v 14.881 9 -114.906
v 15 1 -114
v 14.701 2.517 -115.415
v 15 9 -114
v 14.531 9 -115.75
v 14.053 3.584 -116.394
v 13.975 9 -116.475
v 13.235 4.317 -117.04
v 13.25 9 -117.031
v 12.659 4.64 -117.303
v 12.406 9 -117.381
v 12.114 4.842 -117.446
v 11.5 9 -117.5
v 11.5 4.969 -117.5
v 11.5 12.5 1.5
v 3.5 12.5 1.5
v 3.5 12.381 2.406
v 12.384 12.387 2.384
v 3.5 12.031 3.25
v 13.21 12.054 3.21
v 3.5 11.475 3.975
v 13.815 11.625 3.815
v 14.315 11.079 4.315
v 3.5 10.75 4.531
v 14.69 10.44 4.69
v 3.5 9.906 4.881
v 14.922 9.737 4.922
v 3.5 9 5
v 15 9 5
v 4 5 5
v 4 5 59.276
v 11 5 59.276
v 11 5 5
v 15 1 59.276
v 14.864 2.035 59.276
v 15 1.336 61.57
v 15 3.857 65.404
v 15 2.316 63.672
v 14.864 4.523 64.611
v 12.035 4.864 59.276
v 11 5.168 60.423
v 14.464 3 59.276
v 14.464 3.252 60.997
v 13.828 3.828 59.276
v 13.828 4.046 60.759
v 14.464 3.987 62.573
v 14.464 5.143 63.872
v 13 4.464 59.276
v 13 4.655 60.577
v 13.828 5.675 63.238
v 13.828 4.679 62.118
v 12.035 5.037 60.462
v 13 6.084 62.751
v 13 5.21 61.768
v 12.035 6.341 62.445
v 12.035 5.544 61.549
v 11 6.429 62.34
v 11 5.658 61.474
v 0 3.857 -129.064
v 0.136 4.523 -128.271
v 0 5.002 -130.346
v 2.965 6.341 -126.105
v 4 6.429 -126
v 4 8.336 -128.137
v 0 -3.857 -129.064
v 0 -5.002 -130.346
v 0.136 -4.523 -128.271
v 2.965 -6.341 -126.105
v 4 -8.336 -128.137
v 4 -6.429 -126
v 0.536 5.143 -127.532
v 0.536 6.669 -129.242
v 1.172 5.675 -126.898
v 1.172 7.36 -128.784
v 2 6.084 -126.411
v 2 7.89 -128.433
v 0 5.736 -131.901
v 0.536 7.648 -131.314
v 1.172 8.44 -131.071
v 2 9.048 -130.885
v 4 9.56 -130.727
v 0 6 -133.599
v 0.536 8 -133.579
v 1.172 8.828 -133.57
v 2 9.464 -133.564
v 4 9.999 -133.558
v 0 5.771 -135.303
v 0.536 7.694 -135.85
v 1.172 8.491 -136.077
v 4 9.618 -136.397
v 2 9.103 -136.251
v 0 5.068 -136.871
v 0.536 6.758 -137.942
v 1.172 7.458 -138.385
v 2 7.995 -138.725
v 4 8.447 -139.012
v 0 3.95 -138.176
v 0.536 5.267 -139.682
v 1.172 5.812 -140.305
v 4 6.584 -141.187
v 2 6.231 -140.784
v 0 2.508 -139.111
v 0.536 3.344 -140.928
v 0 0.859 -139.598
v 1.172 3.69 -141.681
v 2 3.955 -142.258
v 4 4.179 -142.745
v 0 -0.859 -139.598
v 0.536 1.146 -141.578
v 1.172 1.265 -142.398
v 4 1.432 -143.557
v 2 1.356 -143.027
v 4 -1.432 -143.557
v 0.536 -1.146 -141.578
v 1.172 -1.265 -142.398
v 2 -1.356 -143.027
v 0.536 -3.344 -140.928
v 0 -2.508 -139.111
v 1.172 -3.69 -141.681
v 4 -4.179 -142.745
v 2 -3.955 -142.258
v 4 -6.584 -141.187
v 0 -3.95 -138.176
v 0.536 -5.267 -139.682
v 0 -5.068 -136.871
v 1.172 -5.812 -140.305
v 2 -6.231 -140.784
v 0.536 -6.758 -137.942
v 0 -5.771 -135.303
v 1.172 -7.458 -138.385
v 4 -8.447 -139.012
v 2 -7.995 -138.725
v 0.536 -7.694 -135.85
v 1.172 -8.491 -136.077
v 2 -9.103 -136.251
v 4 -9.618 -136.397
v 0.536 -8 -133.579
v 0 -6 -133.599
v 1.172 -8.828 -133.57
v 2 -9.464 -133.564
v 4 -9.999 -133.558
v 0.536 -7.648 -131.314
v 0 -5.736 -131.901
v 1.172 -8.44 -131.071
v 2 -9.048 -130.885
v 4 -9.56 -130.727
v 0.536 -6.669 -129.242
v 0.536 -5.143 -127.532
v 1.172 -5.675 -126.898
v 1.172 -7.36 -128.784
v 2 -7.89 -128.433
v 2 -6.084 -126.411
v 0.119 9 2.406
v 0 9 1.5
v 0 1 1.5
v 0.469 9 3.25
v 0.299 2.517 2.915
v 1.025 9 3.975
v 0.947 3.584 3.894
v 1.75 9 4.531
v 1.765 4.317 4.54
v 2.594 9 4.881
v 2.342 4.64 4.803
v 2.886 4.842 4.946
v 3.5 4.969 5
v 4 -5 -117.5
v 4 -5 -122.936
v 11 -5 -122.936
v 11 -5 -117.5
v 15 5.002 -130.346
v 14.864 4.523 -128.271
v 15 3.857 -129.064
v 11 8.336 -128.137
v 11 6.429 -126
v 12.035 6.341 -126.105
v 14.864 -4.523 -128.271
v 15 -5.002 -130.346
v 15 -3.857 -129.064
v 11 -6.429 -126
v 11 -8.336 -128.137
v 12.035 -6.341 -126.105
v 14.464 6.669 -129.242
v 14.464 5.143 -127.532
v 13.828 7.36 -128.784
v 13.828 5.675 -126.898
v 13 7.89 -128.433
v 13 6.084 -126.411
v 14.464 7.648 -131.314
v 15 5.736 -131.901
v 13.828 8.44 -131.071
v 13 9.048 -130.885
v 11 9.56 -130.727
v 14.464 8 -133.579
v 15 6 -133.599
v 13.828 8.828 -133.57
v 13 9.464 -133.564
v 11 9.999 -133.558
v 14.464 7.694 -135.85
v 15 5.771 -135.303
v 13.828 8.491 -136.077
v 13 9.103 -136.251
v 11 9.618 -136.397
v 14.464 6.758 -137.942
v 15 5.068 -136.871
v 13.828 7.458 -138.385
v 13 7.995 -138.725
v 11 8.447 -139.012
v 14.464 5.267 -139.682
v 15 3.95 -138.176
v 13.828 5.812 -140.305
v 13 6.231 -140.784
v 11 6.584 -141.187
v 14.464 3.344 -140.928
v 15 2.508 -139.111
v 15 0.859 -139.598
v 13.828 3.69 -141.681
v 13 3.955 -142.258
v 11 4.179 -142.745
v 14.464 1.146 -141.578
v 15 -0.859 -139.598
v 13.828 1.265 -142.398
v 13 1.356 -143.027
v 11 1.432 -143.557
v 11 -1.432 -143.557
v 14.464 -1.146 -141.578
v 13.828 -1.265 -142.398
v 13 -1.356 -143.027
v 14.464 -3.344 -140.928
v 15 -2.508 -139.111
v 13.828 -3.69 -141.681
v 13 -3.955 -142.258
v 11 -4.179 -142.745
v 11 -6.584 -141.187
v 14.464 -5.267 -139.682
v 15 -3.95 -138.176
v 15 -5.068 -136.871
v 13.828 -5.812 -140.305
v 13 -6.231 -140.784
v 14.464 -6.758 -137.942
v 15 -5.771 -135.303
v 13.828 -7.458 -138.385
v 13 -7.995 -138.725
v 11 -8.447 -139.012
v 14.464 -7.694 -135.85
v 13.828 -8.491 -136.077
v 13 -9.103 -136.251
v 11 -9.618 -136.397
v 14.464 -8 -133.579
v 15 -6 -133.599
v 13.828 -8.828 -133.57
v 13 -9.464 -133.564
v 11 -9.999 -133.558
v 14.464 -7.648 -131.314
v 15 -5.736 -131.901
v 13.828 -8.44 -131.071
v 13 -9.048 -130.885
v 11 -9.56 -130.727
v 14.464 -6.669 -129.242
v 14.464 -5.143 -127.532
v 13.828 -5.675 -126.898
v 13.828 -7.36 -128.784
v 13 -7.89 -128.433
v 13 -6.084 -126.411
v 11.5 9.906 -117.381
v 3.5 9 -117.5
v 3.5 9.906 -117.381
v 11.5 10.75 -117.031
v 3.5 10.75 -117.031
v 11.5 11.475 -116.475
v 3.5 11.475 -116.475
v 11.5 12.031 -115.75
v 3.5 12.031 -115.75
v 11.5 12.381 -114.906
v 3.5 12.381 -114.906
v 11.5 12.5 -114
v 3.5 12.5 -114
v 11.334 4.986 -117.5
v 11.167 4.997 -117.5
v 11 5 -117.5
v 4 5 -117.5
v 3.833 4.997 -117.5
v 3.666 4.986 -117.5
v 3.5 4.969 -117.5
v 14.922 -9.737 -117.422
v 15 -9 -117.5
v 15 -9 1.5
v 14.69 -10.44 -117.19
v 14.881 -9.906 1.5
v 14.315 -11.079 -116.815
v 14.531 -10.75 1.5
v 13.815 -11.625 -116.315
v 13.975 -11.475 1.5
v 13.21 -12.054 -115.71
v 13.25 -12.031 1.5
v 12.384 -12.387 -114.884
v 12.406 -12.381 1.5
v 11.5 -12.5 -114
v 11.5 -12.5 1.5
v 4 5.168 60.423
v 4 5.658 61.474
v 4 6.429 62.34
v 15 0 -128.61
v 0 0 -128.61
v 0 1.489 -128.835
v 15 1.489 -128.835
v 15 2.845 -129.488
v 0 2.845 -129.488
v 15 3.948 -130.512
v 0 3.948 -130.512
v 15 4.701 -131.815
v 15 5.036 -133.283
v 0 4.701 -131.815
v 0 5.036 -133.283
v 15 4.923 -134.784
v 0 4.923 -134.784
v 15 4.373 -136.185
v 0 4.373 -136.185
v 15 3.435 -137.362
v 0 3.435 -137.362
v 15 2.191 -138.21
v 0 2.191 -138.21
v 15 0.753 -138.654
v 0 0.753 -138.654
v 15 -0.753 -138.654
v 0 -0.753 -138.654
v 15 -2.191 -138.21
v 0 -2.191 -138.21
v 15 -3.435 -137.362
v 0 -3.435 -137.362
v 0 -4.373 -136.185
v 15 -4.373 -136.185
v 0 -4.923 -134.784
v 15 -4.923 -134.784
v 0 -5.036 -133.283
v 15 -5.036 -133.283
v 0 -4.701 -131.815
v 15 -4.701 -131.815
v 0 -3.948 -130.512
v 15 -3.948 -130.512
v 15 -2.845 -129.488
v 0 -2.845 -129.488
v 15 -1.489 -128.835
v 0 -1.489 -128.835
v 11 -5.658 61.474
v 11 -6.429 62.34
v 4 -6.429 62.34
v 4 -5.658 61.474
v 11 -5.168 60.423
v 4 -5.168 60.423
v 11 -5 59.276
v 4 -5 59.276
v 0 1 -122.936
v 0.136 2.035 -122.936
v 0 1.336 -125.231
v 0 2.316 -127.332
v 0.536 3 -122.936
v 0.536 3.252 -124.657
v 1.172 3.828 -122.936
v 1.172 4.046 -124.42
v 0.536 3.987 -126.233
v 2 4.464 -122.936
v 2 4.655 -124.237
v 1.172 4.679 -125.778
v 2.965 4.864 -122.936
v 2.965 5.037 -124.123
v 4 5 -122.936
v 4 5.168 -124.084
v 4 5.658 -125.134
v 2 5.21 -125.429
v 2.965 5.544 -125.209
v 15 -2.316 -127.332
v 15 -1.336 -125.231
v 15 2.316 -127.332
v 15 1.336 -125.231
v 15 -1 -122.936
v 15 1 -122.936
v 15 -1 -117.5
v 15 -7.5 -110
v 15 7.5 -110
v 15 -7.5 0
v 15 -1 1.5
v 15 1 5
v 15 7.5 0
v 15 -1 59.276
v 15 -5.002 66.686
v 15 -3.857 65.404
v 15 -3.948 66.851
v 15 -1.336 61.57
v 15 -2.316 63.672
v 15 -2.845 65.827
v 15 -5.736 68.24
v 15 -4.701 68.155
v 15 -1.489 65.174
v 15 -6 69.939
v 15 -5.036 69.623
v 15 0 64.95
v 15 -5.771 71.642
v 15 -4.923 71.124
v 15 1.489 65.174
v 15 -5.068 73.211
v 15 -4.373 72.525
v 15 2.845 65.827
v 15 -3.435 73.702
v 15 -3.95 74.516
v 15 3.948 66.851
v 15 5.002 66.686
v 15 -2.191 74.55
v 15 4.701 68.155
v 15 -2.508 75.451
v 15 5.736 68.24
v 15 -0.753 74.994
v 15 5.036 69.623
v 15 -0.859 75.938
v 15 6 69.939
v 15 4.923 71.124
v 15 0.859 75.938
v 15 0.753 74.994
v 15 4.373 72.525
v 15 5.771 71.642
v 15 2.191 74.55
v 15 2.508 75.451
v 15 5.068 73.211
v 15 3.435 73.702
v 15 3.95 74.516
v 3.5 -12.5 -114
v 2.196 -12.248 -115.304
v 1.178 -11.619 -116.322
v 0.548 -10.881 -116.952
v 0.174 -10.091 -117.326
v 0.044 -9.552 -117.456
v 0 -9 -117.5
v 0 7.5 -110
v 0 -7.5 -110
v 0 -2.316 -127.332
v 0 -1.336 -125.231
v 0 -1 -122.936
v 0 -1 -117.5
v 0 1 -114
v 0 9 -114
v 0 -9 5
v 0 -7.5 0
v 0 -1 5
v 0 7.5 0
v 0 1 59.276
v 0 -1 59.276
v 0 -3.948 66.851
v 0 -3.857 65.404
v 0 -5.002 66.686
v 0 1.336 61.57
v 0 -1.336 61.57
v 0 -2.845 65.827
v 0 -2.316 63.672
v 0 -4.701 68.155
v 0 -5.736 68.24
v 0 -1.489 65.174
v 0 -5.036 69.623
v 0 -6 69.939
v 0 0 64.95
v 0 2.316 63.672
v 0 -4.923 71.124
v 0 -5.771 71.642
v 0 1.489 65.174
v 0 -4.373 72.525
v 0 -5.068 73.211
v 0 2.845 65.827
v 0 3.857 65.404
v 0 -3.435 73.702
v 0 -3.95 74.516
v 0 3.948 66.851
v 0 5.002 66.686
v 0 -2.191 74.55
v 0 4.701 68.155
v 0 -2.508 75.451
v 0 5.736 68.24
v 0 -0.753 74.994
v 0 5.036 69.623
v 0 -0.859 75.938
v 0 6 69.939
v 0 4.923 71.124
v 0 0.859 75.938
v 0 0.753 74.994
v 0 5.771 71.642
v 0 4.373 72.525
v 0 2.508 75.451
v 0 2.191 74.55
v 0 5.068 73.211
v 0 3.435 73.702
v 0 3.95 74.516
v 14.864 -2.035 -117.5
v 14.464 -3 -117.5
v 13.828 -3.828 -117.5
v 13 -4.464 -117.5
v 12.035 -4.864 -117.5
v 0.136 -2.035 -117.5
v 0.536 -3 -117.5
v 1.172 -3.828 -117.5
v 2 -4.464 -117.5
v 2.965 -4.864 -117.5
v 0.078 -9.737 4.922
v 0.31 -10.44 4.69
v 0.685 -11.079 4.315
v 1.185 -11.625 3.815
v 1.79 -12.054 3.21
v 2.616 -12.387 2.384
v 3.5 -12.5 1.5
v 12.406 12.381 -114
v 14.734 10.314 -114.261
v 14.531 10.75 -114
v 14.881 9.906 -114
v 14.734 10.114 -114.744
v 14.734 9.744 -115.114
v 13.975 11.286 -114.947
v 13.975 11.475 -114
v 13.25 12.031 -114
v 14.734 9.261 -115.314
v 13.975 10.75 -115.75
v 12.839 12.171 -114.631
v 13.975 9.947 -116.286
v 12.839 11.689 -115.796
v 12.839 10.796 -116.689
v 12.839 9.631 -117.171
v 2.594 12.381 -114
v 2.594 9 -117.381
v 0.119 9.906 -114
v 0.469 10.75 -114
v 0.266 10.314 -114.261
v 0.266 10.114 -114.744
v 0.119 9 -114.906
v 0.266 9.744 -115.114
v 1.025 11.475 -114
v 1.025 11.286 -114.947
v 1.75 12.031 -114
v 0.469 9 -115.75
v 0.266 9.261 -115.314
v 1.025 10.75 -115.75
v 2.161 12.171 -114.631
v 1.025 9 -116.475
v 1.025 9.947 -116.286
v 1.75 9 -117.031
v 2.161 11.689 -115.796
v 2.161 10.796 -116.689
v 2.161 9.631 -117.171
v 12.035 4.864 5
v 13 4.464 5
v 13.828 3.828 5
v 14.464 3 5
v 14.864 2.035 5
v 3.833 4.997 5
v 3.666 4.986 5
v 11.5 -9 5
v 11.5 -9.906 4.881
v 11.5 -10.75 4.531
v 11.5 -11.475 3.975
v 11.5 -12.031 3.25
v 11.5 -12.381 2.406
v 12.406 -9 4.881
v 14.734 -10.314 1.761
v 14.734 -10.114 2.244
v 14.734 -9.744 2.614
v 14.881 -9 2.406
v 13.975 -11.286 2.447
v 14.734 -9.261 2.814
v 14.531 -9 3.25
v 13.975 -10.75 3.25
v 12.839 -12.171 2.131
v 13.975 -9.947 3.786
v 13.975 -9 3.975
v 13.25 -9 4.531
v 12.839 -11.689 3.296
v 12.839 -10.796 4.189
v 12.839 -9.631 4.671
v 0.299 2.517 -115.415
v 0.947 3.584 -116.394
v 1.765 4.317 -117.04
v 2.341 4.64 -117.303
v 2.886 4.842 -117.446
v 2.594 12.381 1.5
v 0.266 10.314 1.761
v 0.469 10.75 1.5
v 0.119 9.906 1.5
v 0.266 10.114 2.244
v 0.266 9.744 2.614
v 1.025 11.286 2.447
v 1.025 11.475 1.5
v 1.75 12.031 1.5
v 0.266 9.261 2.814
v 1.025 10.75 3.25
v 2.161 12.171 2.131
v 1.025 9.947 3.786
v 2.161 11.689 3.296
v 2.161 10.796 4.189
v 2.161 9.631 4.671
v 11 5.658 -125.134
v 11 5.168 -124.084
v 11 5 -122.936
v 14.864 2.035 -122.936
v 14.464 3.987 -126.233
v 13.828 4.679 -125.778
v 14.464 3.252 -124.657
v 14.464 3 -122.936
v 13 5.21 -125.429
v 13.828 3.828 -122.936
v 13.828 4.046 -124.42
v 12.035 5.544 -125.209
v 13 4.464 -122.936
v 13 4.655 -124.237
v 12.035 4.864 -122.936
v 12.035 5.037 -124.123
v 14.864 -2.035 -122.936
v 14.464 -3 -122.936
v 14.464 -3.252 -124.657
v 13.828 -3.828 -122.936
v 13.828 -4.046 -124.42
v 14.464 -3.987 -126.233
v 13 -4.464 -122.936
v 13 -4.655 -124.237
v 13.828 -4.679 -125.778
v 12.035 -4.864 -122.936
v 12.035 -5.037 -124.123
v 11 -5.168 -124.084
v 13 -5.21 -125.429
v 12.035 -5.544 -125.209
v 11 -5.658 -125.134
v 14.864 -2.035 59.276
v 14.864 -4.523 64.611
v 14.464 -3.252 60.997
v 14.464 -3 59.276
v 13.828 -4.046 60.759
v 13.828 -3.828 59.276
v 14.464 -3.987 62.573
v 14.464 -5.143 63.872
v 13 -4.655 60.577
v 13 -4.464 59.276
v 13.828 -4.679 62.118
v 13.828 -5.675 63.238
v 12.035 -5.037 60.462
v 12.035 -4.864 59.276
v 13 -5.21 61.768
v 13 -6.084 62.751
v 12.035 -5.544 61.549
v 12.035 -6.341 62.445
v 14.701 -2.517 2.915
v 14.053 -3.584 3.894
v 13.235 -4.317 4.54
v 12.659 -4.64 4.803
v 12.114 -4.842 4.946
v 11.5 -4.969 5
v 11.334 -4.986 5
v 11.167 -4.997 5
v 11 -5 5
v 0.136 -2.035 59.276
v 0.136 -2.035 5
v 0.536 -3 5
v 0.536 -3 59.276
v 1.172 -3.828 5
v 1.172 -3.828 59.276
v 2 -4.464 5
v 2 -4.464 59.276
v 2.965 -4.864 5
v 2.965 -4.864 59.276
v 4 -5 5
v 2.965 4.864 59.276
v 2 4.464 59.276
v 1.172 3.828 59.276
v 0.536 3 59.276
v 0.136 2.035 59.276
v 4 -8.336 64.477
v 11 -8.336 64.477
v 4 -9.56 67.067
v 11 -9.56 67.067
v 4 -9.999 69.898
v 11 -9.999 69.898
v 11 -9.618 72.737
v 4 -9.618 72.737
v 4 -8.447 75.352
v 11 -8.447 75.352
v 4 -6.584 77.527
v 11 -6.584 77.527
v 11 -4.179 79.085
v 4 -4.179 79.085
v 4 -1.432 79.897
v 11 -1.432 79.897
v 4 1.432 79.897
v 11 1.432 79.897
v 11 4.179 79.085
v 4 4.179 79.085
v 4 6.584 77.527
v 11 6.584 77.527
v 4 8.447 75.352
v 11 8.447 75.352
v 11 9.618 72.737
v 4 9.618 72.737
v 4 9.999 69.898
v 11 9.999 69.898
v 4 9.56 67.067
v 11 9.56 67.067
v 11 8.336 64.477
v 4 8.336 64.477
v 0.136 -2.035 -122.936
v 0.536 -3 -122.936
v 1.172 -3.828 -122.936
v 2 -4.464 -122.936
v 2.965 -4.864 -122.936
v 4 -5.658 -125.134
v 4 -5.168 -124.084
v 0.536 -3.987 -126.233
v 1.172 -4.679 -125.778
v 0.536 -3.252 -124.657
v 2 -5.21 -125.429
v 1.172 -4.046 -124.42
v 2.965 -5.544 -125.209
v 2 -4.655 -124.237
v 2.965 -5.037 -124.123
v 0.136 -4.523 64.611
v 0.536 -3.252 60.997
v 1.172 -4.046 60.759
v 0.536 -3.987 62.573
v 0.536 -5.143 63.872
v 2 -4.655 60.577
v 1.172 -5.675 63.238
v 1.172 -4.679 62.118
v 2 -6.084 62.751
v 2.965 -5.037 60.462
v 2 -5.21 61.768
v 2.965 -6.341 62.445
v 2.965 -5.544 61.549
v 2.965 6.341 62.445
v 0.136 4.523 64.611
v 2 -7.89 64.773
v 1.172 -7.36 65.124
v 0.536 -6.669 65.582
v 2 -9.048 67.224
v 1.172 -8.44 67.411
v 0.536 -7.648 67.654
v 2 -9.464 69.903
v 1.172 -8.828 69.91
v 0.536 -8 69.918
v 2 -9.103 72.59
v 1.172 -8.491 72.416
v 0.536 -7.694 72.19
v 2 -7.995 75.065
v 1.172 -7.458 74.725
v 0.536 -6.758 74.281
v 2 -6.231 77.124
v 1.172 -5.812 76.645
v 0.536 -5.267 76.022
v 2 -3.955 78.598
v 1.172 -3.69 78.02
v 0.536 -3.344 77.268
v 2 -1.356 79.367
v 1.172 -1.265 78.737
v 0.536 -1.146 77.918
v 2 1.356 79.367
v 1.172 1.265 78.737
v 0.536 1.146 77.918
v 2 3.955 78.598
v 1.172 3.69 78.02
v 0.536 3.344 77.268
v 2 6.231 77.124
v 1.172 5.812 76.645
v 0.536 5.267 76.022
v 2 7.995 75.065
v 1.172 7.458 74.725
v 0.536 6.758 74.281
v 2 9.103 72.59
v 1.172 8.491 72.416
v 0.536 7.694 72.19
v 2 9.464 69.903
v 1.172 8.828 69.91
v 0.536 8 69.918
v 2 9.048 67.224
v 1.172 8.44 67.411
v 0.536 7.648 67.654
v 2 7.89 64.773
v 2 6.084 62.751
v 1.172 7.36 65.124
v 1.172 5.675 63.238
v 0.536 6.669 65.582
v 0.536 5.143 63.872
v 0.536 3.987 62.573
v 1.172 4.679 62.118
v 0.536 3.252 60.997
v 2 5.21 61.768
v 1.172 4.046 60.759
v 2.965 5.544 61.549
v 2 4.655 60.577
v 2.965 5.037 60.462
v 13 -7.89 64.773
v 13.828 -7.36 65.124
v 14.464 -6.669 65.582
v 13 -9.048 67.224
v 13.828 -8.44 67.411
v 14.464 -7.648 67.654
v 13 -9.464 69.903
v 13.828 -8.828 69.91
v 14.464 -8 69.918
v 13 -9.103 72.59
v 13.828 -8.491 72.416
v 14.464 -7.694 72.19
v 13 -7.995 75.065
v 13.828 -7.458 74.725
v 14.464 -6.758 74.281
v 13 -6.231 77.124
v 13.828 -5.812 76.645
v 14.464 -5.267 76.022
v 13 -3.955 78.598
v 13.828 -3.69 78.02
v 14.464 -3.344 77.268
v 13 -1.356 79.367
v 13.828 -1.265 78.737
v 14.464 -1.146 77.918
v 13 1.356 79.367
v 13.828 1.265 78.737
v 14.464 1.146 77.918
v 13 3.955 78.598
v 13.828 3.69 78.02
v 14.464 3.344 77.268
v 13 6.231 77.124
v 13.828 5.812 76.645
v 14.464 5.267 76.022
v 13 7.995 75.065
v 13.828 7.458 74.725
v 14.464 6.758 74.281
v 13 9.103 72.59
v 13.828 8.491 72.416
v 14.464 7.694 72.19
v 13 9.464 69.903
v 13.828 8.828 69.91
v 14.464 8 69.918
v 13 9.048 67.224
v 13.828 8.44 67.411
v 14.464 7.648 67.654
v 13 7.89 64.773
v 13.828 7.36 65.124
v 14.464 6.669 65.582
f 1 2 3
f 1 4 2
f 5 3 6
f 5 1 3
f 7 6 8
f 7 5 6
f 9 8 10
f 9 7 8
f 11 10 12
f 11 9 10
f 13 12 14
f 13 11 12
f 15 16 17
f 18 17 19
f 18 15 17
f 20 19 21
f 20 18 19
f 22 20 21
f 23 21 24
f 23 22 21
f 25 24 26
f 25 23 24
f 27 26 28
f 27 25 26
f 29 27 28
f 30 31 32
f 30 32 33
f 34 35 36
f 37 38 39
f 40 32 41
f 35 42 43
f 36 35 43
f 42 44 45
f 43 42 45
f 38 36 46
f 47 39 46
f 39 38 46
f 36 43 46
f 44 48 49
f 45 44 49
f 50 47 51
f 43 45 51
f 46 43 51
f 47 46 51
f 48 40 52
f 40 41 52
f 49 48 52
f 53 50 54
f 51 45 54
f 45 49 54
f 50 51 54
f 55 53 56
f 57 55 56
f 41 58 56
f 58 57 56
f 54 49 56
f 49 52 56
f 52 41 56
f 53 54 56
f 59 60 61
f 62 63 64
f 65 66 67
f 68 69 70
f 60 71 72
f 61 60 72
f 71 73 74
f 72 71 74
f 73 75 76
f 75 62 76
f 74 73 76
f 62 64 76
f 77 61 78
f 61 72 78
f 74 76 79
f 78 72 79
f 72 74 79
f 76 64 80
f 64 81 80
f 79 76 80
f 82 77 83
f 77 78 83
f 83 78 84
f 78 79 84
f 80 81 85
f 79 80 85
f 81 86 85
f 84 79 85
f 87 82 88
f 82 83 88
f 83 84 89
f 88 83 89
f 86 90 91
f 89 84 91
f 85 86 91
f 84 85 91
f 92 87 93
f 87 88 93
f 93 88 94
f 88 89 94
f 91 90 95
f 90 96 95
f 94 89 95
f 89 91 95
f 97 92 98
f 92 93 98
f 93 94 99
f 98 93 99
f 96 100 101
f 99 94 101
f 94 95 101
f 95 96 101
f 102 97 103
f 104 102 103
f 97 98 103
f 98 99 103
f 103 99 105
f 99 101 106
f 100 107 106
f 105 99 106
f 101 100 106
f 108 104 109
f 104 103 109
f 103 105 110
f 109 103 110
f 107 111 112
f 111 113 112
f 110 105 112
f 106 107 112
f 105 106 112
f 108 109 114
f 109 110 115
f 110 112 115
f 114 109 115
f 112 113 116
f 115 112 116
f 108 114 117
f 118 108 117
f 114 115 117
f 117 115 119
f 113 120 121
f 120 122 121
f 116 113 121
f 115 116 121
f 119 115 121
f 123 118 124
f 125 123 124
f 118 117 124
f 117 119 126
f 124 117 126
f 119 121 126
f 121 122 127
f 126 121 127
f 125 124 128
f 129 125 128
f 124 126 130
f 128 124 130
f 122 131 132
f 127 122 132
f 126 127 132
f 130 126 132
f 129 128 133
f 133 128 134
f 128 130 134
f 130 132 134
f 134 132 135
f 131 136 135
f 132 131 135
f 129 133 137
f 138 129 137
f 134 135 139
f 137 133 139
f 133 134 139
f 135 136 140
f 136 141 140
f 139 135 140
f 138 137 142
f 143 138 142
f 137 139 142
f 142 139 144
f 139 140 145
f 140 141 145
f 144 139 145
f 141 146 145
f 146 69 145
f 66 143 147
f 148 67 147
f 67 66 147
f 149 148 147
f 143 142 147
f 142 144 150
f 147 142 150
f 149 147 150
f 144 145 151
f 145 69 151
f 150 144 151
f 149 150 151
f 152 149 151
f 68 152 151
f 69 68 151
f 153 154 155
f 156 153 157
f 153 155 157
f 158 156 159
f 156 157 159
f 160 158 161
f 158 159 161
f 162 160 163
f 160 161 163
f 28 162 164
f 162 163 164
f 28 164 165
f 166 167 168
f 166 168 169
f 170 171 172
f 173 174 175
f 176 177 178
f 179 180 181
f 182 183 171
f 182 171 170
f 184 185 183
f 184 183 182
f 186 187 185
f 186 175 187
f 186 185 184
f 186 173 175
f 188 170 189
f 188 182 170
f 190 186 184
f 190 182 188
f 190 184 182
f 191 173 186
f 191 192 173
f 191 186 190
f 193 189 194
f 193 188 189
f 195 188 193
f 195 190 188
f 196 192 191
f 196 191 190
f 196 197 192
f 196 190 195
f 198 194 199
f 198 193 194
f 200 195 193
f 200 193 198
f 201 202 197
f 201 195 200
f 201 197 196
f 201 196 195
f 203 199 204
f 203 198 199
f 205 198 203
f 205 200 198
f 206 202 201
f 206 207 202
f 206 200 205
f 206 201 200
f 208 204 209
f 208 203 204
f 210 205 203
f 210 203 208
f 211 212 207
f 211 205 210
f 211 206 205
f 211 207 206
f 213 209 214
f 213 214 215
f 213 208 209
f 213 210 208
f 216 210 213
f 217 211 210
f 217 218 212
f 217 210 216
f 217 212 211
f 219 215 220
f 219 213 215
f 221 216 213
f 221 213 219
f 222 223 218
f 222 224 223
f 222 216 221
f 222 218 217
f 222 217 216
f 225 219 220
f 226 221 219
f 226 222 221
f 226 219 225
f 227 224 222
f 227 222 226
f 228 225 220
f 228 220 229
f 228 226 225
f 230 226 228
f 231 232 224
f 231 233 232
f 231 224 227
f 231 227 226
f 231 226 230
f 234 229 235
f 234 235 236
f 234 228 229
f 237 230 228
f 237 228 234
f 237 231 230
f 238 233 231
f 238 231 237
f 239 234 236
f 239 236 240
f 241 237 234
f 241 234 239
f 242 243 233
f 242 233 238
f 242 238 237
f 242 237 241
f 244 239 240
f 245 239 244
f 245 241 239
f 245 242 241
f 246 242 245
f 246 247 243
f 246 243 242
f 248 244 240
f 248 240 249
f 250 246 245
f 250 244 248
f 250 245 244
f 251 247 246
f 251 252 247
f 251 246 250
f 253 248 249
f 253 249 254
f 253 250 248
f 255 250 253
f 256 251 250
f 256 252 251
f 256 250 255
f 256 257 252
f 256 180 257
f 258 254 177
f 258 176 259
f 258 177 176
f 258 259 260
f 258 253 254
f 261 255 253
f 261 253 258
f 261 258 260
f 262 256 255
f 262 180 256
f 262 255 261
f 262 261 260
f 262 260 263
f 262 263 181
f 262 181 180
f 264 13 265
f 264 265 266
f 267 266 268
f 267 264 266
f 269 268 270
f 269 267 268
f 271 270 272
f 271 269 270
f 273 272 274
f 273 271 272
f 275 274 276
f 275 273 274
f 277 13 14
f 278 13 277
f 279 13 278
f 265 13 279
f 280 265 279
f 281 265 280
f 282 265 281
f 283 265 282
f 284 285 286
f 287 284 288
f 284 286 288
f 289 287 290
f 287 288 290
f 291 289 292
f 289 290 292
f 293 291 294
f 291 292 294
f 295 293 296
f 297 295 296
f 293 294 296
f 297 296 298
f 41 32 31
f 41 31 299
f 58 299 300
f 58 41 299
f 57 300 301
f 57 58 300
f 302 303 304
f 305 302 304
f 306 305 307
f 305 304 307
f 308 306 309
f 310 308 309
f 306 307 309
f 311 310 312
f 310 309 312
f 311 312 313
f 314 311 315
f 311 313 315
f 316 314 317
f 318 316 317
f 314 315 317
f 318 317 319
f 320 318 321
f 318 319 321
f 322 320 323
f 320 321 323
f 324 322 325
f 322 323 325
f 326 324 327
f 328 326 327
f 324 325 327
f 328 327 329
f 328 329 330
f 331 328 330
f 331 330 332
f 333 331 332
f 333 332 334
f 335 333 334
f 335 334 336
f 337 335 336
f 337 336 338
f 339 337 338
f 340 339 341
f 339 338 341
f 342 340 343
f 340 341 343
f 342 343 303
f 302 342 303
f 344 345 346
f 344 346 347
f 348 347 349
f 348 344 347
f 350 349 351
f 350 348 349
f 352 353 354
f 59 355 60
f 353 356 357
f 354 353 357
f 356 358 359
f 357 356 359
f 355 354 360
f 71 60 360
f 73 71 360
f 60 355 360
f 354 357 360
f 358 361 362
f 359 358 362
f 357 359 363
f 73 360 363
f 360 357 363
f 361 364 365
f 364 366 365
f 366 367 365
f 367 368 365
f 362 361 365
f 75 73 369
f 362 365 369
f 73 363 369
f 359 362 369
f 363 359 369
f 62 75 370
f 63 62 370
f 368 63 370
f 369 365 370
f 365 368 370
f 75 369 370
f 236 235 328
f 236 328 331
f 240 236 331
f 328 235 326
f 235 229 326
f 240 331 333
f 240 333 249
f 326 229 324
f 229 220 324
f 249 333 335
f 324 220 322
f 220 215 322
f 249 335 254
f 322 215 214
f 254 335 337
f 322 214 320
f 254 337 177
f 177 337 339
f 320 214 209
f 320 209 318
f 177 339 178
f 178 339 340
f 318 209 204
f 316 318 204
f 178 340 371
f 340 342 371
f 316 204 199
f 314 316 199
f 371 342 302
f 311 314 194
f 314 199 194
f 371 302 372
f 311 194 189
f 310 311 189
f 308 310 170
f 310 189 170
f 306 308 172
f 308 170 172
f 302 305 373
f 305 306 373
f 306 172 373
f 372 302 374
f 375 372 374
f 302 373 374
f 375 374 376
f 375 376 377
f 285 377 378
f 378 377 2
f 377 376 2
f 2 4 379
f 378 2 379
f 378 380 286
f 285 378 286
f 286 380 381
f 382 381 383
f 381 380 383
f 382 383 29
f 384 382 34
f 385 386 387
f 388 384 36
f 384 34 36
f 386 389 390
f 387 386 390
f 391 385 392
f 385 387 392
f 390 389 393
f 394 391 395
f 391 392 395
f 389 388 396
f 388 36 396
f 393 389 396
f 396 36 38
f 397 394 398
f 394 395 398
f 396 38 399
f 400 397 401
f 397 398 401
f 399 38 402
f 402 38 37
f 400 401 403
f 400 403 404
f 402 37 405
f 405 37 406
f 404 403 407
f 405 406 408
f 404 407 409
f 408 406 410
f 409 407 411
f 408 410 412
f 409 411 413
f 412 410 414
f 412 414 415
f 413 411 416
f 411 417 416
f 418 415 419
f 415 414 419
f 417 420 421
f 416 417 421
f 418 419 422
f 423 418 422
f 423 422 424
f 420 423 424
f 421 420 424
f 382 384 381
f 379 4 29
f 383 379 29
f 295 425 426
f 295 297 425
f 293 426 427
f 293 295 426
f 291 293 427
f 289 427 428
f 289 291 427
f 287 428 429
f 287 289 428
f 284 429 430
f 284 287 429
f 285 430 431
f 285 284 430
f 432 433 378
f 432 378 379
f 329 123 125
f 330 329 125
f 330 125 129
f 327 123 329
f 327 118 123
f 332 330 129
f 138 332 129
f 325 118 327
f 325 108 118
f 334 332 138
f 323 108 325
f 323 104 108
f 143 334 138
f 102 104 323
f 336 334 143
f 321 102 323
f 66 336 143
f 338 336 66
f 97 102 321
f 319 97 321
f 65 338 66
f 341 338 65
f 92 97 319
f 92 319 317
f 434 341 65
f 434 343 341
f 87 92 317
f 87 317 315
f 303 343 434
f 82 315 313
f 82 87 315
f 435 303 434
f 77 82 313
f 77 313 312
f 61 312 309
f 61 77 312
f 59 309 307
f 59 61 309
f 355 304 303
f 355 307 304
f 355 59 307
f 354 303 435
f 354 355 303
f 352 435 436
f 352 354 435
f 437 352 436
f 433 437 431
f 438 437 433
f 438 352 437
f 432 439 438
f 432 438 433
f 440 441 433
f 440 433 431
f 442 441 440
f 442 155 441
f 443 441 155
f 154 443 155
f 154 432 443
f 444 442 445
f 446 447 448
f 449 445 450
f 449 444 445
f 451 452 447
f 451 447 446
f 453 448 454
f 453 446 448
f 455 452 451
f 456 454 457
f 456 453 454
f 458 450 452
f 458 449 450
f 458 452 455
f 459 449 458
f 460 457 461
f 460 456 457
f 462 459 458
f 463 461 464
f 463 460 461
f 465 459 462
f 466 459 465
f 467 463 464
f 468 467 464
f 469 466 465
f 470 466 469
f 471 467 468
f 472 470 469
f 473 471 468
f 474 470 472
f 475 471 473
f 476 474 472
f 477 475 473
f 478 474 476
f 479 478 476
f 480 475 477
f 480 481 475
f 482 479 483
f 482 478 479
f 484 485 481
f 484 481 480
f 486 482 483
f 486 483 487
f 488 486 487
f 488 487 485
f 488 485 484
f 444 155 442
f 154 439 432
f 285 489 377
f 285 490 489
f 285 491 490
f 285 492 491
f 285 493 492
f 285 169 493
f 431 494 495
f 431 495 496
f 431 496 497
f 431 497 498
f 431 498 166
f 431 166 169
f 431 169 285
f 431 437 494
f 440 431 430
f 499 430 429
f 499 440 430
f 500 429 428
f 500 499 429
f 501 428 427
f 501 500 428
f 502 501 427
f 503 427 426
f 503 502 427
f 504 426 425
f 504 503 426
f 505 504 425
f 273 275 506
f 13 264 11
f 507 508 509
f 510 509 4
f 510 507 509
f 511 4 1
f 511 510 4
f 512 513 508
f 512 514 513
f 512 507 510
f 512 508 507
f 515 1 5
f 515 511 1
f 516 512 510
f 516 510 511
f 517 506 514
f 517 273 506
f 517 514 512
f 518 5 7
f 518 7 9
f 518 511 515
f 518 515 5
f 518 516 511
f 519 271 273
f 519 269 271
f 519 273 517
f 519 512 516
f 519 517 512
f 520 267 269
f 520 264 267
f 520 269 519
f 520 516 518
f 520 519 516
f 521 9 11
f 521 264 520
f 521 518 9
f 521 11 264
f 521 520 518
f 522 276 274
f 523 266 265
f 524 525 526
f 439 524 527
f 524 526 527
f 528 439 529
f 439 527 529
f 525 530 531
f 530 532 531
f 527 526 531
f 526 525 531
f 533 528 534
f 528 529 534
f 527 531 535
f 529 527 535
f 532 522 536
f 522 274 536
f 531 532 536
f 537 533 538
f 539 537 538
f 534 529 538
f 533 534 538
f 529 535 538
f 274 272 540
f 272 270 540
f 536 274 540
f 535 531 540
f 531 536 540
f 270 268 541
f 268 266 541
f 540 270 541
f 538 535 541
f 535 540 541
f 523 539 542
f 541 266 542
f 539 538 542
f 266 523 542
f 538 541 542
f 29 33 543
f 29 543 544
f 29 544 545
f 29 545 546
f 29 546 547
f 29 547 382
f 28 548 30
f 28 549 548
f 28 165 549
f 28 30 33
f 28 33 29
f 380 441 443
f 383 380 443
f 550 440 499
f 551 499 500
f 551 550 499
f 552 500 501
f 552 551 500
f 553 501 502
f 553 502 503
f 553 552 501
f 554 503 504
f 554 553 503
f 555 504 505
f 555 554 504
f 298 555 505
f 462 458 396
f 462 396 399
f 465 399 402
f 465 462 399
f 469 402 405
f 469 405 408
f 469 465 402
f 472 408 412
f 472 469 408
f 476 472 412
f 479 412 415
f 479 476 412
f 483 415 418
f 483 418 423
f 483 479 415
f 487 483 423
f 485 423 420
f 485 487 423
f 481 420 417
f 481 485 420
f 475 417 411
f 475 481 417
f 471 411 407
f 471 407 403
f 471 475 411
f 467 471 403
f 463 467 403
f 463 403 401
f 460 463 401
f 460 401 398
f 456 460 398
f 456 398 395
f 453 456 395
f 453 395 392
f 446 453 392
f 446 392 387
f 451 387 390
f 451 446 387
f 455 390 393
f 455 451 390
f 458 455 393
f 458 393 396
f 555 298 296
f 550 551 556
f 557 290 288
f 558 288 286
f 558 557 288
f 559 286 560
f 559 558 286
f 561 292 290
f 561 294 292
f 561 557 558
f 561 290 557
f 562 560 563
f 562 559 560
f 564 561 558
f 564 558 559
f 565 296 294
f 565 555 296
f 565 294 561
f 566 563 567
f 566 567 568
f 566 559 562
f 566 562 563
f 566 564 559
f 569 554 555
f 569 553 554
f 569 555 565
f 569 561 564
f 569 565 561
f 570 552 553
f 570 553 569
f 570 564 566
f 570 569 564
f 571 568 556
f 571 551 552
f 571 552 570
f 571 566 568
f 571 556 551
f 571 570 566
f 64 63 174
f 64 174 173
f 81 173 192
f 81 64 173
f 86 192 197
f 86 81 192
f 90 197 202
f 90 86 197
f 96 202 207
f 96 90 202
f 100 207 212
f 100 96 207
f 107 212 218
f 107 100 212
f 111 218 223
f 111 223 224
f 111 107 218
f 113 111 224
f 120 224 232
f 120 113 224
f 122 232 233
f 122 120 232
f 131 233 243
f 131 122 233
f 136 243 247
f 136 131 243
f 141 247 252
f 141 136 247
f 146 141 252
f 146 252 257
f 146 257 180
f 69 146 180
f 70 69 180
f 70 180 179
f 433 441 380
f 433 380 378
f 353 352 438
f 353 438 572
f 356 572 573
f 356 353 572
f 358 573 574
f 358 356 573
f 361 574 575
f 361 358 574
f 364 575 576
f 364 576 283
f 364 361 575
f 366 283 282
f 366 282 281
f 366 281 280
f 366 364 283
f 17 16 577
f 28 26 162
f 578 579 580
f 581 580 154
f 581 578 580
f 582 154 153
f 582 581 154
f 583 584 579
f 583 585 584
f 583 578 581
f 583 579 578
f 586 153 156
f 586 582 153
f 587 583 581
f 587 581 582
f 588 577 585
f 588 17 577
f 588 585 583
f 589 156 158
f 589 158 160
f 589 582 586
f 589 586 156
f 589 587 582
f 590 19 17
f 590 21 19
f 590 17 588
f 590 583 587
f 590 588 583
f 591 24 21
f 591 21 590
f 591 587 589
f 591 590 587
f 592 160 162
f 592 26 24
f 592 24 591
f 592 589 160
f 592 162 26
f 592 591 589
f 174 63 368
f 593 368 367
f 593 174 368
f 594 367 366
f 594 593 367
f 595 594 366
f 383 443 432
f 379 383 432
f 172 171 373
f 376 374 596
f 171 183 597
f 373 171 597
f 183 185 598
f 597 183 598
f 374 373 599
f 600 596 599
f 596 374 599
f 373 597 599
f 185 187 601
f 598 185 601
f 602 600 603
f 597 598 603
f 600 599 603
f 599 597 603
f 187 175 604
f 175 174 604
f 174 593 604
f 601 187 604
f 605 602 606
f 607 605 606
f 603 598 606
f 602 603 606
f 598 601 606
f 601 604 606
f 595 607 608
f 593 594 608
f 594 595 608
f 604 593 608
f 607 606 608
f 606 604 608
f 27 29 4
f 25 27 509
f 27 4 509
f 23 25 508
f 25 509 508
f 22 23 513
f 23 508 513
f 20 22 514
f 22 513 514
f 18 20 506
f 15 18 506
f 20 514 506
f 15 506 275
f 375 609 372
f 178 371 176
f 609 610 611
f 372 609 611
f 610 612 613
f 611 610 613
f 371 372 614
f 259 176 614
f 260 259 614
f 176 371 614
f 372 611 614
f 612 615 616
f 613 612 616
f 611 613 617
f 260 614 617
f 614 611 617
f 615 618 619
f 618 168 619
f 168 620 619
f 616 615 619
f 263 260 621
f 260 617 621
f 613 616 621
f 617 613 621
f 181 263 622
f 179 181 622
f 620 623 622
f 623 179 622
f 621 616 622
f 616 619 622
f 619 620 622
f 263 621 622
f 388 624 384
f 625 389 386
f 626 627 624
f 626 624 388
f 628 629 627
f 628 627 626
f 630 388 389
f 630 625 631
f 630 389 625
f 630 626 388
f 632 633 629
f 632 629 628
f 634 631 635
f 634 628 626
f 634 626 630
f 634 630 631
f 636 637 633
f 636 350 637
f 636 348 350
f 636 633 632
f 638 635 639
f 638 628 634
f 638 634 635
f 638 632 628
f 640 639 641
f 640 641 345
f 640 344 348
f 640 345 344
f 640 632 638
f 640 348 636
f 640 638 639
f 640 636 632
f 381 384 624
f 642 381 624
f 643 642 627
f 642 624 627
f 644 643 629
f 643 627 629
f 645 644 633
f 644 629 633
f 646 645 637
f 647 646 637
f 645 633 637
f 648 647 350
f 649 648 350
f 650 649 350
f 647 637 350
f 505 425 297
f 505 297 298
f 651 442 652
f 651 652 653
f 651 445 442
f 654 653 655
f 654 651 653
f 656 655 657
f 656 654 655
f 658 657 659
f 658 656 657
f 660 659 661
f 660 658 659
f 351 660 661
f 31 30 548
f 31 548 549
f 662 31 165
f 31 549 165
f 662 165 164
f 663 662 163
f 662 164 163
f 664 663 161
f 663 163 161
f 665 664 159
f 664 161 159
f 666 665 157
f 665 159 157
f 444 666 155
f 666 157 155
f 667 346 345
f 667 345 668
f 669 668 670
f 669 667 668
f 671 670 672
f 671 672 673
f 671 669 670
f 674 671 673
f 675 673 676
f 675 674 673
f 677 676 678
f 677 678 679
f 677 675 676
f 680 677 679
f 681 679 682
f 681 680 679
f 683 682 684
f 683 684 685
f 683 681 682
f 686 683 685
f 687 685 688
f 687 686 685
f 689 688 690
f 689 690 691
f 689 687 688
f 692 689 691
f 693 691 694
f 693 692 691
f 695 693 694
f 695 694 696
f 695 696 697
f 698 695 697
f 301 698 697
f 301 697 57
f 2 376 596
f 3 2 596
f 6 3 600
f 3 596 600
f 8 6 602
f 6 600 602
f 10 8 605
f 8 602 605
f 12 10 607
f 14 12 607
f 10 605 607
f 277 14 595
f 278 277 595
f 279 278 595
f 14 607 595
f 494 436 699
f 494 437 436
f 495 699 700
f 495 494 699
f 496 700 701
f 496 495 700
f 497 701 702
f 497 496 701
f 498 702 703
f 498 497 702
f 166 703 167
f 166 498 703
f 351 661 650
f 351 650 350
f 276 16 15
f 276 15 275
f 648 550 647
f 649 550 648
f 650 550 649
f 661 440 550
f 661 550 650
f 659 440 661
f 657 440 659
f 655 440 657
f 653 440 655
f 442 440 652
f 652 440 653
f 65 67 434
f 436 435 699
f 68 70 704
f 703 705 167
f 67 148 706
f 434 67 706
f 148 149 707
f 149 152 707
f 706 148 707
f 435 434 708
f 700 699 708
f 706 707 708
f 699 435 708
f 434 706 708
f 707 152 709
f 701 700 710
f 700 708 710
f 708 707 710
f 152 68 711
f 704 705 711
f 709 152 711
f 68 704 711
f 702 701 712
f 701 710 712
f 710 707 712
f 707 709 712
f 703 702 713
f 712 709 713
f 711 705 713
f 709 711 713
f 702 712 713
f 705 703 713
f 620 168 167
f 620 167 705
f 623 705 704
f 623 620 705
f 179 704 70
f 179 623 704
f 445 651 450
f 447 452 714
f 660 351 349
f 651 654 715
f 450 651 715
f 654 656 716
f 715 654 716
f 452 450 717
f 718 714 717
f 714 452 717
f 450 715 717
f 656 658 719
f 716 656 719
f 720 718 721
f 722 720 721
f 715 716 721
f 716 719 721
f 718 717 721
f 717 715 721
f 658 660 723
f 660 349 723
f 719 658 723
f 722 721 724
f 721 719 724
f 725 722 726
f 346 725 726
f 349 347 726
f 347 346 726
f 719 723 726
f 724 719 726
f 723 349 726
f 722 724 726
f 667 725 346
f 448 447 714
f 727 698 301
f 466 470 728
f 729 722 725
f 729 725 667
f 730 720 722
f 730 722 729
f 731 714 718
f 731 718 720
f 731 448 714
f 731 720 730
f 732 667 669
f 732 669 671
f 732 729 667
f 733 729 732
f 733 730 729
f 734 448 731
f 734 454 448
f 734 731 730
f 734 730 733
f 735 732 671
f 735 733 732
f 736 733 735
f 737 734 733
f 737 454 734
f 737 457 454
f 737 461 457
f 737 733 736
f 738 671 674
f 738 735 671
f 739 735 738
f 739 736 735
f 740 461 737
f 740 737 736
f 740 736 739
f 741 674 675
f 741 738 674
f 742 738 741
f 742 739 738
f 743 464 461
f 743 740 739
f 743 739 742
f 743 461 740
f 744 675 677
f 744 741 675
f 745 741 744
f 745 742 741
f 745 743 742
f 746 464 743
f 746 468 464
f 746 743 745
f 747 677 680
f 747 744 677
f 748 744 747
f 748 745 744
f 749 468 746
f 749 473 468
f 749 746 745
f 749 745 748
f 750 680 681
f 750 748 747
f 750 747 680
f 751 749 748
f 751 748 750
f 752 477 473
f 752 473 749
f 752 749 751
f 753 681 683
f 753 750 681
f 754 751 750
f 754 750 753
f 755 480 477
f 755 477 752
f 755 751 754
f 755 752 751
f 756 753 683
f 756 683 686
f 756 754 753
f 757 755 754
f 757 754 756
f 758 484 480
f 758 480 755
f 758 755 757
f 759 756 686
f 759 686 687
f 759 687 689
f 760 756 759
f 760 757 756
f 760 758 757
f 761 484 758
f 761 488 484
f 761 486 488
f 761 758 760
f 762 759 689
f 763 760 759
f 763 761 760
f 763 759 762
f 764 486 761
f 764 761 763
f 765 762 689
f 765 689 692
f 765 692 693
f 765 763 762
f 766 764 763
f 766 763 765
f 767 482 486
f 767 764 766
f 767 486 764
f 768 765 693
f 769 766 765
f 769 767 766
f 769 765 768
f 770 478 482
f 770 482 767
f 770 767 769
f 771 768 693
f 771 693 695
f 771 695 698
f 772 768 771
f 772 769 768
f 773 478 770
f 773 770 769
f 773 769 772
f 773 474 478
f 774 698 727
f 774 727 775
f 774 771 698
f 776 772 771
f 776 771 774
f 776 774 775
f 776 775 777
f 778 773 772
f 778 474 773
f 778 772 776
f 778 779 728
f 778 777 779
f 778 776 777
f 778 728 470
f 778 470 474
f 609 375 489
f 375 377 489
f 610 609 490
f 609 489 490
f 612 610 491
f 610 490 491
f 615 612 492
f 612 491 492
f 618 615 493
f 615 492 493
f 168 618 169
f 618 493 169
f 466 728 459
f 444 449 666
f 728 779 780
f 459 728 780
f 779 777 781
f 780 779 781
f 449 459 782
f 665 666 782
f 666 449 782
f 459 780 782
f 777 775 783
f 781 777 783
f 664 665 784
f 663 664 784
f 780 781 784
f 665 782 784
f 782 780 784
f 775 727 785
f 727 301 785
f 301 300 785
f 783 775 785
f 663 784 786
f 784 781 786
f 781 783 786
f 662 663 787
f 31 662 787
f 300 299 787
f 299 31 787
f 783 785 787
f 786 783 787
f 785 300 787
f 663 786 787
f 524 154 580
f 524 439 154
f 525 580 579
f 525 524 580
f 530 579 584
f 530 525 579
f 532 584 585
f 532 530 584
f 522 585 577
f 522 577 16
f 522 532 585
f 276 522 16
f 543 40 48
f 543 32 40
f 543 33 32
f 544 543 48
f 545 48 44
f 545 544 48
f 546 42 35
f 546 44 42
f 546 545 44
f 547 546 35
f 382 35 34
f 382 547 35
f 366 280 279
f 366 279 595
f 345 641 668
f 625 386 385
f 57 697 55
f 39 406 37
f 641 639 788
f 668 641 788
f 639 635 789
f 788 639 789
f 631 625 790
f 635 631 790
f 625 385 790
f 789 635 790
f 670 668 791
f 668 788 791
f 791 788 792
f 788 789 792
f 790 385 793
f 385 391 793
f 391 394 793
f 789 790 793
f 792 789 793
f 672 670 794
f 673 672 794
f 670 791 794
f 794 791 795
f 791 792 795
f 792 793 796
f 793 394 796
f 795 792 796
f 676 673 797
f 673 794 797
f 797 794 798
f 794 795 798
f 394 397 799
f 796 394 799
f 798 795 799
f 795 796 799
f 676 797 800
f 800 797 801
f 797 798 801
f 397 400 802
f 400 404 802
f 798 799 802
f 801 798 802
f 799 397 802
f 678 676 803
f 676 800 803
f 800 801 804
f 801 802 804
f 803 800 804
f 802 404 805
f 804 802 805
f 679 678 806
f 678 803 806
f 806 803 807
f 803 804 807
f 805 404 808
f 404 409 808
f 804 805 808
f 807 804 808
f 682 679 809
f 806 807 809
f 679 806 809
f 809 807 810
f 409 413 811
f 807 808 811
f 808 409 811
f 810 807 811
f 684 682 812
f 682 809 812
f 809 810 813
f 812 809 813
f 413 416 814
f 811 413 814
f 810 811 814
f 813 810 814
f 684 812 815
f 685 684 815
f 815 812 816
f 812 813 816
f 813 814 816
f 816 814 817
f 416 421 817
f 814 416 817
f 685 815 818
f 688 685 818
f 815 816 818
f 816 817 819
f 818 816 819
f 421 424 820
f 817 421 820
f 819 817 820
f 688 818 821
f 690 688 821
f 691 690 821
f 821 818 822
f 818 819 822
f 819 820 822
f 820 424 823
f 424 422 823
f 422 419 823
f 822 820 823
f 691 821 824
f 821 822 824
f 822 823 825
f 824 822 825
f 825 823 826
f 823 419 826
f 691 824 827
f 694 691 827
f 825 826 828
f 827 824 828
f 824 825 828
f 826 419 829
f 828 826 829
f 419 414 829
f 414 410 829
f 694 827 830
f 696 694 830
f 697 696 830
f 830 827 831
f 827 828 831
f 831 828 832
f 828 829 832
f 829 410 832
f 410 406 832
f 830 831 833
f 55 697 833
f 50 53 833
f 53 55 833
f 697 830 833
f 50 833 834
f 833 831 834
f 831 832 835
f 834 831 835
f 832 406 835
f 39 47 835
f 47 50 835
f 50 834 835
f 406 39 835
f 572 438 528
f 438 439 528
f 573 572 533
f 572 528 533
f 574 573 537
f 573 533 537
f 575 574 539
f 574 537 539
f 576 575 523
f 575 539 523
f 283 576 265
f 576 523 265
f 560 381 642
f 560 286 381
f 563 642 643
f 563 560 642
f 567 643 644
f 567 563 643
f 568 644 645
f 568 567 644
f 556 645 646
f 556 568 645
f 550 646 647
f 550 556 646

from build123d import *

# Parameters (mm, degrees)
SKETCH1_W           = 220
SKETCH1_H           = 30
BOSS_EXTRUDE1_DEPTH = 30
SKETCH2_R           = 10.1
CUT_EXTRUDE1_DEPTH  = 30
SKETCH3_R           = 10.1
CUT_EXTRUDE2_DEPTH  = 30
FILLET1_R           = 8
FILLET2_R           = 8
FILLET4_R           = 7
SCALE1_SCALE        = 0.5


with BuildPart() as part:
    # Sketch1 → Boss-Extrude1 (new body)
    with BuildSketch(Plane(origin=(0, 0, 0), x_dir=(0, 0, -1), z_dir=(1, 0, 0))):
        with BuildLine():
            Line((-122.679491924, 10), (-10, 10))
            Line((-10, 10), (-10, 25))
            Line((-10, 25), (235, 25))
            Line((235, 25), (235, 10))
            Line((235, 10), (250, 10))
            ThreePointArc((250, 10), (287.320508076, 0), (250, -10))
            Line((250, -10), (235, -10))
            Line((235, -10), (235, -25))
            Line((235, -25), (-10, -25))
            Line((-10, -25), (-10, -10))
            Line((-10, -10), (-122.679491924, -10))
            ThreePointArc((-122.679491924, -10), (-160, 0), (-122.679491924, 10))
        make_face()
        with Locations((110, 0)):
            Rectangle(SKETCH1_W, SKETCH1_H, mode=Mode.SUBTRACT)
    extrude(amount=BOSS_EXTRUDE1_DEPTH)

    # Sketch2 → Cut-Extrude1 (cut)
    with BuildSketch(Plane(origin=(0, 0, 0), x_dir=(0, 0, -1), z_dir=(1, 0, 0))):
        with Locations((-140, 0)):
            Circle(SKETCH2_R)
    extrude(amount=CUT_EXTRUDE1_DEPTH, mode=Mode.SUBTRACT)

    # Sketch3 → Cut-Extrude2 (cut)
    with BuildSketch(Plane.ZY):
        with Locations((-267.320508076, 0)):
            Circle(SKETCH3_R)
    extrude(amount=-CUT_EXTRUDE2_DEPTH, mode=Mode.SUBTRACT)

    # Fillet1
    fillet1_edges = [part.edges().sort_by_distance(p)[0] for p in [
        (0, -10, 66.339745962),
        (0, 0, 160),
        (0, 10, 66.339745962),
        (30, 10, 66.339745962),
        (30, 0, 160),
        (15, -10, 122.679491924),
        (15, 10, 122.679491924),
        (30, -10, 66.339745962),
    ]]
    fillet(fillet1_edges, radius=FILLET1_R)

    # Fillet2
    fillet2_edges = [part.edges().sort_by_distance(p)[0] for p in [
        (0, 10, -242.5),
        (0, 0, -287.320508076),
        (0, -10, -242.5),
        (15, 10, -250),
        (15, -10, -250),
        (30, -10, -242.5),
        (30, 0, -287.320508076),
        (30, 10, -242.5),
    ]]
    fillet(fillet2_edges, radius=FILLET2_R)

    # Fillet4
    fillet4_edges = [part.edges().sort_by_distance(p)[0] for p in [
        (15, -25, 10),
        (30, -25, -112.5),
        (15, -25, -235),
        (0, -25, -112.5),
        (15, 25, -235),
        (30, 25, -112.5),
        (15, 25, 10),
        (0, 25, -112.5),
        (30, 13.5, -235),
        (0, 13.5, -235),
        (0, 13.5, 10),
        (30, -13.5, 10),
    ]]
    fillet(fillet4_edges, radius=FILLET4_R)


with BuildPart() as part_1:
    # Scale1: scaled about (0, 0, 0)
    add(part.part.scale(SCALE1_SCALE))


solid = part_1.part
